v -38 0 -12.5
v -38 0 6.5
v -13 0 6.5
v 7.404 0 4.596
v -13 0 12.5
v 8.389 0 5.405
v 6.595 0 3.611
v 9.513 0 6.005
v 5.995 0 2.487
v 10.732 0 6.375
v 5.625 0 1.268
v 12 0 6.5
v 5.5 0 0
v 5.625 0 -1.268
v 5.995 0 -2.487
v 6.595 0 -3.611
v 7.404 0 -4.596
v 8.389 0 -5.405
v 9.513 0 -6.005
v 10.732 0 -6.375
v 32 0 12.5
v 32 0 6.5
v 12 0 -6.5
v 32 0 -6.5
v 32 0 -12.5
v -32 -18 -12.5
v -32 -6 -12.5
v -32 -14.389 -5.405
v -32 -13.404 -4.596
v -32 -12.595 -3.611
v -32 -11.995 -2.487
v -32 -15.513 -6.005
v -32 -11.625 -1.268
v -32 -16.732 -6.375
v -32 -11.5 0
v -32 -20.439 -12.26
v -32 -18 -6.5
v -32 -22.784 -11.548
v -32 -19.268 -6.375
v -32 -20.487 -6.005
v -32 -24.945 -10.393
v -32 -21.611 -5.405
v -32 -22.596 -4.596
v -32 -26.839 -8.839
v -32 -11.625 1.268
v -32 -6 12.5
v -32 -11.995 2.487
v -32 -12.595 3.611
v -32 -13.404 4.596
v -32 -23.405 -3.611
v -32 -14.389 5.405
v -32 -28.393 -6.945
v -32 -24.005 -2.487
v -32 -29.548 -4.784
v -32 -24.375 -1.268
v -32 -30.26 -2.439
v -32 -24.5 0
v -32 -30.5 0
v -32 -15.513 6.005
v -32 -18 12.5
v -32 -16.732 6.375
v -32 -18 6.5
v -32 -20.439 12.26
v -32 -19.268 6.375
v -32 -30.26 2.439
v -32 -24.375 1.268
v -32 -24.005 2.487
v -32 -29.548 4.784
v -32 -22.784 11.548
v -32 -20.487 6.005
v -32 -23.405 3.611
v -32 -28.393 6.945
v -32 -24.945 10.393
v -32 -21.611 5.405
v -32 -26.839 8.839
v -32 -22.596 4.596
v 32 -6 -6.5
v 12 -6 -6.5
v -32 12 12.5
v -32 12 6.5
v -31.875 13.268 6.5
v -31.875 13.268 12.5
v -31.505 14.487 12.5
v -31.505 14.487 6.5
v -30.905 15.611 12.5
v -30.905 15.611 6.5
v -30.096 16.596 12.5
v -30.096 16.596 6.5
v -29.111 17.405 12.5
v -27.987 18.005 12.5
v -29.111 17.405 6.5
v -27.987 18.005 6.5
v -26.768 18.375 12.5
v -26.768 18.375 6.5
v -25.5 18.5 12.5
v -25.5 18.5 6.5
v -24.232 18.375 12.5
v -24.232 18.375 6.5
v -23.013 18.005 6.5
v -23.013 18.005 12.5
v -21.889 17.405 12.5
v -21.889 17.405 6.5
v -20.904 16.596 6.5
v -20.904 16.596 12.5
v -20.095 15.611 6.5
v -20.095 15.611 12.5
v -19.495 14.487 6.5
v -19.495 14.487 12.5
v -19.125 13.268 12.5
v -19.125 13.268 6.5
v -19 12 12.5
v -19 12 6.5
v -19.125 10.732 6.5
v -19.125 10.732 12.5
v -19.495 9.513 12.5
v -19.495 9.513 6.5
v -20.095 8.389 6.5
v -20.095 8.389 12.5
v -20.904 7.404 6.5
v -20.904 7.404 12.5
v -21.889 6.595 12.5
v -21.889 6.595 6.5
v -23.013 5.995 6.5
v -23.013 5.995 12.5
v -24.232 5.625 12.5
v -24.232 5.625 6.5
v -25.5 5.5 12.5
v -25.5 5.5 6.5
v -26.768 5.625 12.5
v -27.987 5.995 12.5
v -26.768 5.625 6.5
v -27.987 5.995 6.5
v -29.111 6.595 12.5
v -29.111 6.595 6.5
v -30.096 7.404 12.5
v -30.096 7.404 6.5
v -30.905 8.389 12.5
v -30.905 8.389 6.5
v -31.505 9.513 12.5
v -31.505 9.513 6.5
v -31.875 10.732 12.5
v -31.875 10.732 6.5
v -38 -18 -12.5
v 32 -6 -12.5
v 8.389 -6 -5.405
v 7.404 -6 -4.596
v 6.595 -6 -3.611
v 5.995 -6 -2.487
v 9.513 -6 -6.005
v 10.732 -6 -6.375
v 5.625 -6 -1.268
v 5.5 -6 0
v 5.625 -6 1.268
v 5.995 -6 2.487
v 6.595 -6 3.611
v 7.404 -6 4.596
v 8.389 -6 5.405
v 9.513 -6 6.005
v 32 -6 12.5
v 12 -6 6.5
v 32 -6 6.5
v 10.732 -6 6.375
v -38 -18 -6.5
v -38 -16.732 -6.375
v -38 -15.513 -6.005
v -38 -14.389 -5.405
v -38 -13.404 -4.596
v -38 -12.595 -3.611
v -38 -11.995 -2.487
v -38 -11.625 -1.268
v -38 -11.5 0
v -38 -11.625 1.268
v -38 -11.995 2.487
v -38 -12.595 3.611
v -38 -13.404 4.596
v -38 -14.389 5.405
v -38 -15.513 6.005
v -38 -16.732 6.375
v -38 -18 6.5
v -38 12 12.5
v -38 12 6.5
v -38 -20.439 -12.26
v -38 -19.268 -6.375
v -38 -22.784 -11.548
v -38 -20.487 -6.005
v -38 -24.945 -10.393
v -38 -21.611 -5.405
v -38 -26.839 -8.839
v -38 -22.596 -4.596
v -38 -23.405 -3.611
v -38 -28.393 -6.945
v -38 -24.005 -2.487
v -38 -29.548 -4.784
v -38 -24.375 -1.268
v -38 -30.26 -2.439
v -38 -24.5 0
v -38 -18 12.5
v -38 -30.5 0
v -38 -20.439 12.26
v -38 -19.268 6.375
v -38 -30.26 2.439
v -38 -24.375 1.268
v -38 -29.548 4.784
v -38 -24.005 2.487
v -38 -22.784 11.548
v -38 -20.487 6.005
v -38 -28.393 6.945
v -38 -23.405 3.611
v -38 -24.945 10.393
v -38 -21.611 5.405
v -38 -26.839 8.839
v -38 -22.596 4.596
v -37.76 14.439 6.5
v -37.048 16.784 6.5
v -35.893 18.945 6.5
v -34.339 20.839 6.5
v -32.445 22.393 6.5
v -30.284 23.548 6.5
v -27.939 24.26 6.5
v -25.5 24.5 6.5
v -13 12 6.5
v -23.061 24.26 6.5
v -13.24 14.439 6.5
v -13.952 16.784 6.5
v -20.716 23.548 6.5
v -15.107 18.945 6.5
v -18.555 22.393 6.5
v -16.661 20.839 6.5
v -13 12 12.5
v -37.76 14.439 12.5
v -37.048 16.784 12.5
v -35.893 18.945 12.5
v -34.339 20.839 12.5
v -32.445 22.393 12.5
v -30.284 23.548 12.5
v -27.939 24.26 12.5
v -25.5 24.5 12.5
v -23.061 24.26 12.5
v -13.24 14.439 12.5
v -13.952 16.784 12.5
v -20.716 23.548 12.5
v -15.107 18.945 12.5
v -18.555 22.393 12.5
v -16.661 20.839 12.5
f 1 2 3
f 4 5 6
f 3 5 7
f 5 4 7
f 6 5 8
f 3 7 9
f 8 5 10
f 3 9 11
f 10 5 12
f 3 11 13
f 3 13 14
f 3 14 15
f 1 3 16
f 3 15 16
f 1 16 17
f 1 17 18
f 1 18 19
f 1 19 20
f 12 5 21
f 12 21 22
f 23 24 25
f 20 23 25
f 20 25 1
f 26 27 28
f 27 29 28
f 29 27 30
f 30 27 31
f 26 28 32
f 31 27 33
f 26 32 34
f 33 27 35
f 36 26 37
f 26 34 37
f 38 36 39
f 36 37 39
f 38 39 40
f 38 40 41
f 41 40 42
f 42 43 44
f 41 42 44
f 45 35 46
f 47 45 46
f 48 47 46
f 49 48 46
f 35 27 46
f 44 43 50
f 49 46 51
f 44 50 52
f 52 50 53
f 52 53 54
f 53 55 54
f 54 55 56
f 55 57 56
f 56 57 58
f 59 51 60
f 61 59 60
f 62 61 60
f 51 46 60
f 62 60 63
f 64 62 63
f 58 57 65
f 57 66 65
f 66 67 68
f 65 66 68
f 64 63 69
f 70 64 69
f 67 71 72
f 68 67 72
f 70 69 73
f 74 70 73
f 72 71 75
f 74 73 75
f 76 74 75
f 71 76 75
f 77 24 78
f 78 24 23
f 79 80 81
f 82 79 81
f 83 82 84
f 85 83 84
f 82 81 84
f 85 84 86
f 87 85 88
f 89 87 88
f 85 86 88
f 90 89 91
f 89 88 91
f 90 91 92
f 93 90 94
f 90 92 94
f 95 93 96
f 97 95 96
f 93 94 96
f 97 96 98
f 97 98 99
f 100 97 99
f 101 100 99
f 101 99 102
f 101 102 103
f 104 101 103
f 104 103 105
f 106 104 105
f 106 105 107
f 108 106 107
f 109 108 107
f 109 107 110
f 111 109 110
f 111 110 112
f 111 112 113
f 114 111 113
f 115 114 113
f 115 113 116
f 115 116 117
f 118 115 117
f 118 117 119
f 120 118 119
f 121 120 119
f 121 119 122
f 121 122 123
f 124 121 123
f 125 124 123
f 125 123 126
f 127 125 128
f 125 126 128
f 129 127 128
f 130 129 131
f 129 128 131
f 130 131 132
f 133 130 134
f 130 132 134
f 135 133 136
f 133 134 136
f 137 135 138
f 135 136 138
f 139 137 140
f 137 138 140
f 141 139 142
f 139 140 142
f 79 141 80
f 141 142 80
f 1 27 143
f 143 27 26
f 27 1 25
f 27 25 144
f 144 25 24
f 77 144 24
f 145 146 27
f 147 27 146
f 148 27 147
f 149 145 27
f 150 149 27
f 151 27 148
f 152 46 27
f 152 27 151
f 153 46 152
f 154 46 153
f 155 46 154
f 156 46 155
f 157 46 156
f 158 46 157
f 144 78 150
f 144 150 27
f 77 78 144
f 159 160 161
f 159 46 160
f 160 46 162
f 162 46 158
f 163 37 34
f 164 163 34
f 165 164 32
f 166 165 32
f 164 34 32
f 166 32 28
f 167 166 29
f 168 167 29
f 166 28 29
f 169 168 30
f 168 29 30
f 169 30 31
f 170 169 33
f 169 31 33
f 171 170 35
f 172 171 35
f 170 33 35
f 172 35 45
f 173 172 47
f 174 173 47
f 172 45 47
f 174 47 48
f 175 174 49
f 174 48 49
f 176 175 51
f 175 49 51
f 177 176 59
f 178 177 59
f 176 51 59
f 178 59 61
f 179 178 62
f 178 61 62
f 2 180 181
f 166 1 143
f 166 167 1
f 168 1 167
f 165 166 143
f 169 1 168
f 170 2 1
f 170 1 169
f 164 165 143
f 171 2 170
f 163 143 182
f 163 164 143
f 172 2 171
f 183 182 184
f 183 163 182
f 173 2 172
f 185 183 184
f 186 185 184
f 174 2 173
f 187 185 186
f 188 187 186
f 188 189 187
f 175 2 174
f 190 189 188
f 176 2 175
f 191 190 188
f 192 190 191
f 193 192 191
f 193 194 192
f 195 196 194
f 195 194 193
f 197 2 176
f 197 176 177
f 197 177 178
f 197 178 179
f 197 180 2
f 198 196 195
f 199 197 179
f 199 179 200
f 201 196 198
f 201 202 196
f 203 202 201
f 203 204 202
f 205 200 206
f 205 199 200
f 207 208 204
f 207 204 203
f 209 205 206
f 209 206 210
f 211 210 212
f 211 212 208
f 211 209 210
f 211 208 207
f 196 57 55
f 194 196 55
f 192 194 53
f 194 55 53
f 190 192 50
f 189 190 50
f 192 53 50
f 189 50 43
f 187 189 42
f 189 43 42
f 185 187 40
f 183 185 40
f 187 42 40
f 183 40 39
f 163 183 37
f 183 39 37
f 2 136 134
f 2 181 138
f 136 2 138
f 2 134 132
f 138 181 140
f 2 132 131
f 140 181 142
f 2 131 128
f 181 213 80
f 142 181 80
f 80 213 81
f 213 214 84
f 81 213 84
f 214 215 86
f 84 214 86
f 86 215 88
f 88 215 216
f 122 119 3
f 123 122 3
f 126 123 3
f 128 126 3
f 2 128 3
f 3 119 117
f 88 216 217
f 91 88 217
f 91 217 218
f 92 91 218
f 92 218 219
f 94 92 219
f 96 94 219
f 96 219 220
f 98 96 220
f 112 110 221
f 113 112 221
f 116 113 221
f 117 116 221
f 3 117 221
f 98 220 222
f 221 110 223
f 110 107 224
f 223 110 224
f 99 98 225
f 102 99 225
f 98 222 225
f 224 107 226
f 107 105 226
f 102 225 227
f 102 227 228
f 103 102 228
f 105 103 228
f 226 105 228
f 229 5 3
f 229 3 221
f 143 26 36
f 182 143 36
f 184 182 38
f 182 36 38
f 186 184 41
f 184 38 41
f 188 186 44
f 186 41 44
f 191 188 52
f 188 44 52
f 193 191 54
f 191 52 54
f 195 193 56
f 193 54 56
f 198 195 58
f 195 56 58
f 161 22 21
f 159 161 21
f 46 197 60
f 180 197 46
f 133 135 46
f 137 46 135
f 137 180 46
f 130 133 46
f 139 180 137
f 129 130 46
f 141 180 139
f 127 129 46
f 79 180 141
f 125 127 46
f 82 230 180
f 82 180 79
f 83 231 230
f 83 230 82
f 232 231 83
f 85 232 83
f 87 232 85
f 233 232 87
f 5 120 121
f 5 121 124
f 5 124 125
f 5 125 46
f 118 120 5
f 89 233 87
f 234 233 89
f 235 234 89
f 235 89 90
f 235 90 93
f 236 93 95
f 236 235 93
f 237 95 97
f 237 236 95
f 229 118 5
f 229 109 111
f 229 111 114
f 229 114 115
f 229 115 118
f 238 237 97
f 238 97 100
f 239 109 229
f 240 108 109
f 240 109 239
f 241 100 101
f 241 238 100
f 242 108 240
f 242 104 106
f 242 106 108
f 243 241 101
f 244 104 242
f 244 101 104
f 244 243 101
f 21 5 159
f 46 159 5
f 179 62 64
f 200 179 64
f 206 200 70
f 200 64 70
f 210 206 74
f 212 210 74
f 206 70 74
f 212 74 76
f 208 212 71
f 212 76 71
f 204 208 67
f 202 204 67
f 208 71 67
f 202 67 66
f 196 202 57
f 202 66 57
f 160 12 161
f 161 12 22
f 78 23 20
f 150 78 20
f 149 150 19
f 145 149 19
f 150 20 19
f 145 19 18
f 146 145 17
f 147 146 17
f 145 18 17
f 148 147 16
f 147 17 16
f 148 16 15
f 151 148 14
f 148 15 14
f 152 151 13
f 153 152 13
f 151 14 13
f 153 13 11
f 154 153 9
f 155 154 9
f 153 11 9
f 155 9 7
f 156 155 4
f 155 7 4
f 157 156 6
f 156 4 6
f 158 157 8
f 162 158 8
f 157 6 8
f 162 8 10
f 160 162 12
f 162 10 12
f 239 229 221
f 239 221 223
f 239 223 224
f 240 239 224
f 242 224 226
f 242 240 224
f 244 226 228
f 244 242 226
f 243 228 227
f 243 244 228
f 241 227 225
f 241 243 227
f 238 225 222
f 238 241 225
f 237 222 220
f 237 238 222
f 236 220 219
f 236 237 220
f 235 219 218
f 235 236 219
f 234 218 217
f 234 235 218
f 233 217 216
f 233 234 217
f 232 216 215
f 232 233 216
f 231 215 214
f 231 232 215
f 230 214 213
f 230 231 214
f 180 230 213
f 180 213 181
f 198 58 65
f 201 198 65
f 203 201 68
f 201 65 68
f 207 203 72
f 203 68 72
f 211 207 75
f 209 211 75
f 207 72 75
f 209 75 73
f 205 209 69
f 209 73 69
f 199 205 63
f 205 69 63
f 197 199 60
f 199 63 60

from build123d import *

# Parameters (mm, degrees)
F1_DEPTH = 6
F3_DEPTH = 6
F4_W     = 25
F4_H     = 12
F5_DEPTH = 6
F6_D     = 13


with BuildPart() as f1:
    # F0 (on Front) → F1 (new body)
    with BuildSketch(Plane.XZ):
        with BuildLine():
            Line((32, 6.5), (32, 12.5))
            Line((32, 12.5), (-32, 12.5))
            Line((-32, 12.5), (-32, -12.5))
            Line((-32, -12.5), (32, -12.5))
            Line((32, -12.5), (32, -6.5))
            Line((32, -6.5), (12, -6.5))
            ThreePointArc((12, -6.5), (5.5, 0), (12, 6.5))
            Line((12, 6.5), (32, 6.5))
        make_face()
    extrude(amount=F1_DEPTH)

    # F2 (on face) → F3 (join)
    with BuildSketch(Plane(origin=(-32, 0, 0), x_dir=(0, -1, 0), z_dir=(-1, 0, 0))):
        with BuildLine():
            Line((18, 12.5), (0, 12.5))
            Line((0, 12.5), (0, -12.5))
            Line((0, -12.5), (18, -12.5))
            ThreePointArc((18, -12.5), (5.5, 0), (18, 12.5))
        make_face()
        with BuildLine():
            ThreePointArc((30.5, 0), (26.8388347648, 8.8388347648), (18, 12.5))
            Line((18, 12.5), (18, 6.5))
            ThreePointArc((18, 6.5), (22.5961940777, 4.5961940777), (24.5, 0))
            ThreePointArc((24.5, 0), (22.5961940777, -4.5961940777), (18, -6.5))
            Line((18, -6.5), (18, -12.5))
            ThreePointArc((18, -12.5), (26.8388347648, -8.8388347648), (30.5, 0))
        make_face()
        with BuildLine():
            Line((18, 6.5), (18, 12.5))
            ThreePointArc((18, 12.5), (5.5, 0), (18, -12.5))
            Line((18, -12.5), (18, -6.5))
            ThreePointArc((18, -6.5), (11.5, 0), (18, 6.5))
        make_face()
    extrude(amount=F3_DEPTH)

    # F4 (on face) → F5 (join)
    with BuildSketch(Plane.XY.offset(12.5)):
        with BuildLine():
            ThreePointArc((-13, 12), (-25.5, 24.5), (-38, 12))
            Line((-38, 12), (-13, 12))
        make_face()
        Polygon((-38, 0), (-38, -6), (-32, -6), (-13, -6), (-13, 0), align=None)
        with Locations((-25.5, 6)):
            Rectangle(F4_W, F4_H)
    extrude(amount=-F5_DEPTH)

    # F6 (through all)
    with Locations(Plane.XY.offset(12.5)):
        with Locations((-25.5, 12)):
            Hole(F6_D / 2)


solid = f1.part
